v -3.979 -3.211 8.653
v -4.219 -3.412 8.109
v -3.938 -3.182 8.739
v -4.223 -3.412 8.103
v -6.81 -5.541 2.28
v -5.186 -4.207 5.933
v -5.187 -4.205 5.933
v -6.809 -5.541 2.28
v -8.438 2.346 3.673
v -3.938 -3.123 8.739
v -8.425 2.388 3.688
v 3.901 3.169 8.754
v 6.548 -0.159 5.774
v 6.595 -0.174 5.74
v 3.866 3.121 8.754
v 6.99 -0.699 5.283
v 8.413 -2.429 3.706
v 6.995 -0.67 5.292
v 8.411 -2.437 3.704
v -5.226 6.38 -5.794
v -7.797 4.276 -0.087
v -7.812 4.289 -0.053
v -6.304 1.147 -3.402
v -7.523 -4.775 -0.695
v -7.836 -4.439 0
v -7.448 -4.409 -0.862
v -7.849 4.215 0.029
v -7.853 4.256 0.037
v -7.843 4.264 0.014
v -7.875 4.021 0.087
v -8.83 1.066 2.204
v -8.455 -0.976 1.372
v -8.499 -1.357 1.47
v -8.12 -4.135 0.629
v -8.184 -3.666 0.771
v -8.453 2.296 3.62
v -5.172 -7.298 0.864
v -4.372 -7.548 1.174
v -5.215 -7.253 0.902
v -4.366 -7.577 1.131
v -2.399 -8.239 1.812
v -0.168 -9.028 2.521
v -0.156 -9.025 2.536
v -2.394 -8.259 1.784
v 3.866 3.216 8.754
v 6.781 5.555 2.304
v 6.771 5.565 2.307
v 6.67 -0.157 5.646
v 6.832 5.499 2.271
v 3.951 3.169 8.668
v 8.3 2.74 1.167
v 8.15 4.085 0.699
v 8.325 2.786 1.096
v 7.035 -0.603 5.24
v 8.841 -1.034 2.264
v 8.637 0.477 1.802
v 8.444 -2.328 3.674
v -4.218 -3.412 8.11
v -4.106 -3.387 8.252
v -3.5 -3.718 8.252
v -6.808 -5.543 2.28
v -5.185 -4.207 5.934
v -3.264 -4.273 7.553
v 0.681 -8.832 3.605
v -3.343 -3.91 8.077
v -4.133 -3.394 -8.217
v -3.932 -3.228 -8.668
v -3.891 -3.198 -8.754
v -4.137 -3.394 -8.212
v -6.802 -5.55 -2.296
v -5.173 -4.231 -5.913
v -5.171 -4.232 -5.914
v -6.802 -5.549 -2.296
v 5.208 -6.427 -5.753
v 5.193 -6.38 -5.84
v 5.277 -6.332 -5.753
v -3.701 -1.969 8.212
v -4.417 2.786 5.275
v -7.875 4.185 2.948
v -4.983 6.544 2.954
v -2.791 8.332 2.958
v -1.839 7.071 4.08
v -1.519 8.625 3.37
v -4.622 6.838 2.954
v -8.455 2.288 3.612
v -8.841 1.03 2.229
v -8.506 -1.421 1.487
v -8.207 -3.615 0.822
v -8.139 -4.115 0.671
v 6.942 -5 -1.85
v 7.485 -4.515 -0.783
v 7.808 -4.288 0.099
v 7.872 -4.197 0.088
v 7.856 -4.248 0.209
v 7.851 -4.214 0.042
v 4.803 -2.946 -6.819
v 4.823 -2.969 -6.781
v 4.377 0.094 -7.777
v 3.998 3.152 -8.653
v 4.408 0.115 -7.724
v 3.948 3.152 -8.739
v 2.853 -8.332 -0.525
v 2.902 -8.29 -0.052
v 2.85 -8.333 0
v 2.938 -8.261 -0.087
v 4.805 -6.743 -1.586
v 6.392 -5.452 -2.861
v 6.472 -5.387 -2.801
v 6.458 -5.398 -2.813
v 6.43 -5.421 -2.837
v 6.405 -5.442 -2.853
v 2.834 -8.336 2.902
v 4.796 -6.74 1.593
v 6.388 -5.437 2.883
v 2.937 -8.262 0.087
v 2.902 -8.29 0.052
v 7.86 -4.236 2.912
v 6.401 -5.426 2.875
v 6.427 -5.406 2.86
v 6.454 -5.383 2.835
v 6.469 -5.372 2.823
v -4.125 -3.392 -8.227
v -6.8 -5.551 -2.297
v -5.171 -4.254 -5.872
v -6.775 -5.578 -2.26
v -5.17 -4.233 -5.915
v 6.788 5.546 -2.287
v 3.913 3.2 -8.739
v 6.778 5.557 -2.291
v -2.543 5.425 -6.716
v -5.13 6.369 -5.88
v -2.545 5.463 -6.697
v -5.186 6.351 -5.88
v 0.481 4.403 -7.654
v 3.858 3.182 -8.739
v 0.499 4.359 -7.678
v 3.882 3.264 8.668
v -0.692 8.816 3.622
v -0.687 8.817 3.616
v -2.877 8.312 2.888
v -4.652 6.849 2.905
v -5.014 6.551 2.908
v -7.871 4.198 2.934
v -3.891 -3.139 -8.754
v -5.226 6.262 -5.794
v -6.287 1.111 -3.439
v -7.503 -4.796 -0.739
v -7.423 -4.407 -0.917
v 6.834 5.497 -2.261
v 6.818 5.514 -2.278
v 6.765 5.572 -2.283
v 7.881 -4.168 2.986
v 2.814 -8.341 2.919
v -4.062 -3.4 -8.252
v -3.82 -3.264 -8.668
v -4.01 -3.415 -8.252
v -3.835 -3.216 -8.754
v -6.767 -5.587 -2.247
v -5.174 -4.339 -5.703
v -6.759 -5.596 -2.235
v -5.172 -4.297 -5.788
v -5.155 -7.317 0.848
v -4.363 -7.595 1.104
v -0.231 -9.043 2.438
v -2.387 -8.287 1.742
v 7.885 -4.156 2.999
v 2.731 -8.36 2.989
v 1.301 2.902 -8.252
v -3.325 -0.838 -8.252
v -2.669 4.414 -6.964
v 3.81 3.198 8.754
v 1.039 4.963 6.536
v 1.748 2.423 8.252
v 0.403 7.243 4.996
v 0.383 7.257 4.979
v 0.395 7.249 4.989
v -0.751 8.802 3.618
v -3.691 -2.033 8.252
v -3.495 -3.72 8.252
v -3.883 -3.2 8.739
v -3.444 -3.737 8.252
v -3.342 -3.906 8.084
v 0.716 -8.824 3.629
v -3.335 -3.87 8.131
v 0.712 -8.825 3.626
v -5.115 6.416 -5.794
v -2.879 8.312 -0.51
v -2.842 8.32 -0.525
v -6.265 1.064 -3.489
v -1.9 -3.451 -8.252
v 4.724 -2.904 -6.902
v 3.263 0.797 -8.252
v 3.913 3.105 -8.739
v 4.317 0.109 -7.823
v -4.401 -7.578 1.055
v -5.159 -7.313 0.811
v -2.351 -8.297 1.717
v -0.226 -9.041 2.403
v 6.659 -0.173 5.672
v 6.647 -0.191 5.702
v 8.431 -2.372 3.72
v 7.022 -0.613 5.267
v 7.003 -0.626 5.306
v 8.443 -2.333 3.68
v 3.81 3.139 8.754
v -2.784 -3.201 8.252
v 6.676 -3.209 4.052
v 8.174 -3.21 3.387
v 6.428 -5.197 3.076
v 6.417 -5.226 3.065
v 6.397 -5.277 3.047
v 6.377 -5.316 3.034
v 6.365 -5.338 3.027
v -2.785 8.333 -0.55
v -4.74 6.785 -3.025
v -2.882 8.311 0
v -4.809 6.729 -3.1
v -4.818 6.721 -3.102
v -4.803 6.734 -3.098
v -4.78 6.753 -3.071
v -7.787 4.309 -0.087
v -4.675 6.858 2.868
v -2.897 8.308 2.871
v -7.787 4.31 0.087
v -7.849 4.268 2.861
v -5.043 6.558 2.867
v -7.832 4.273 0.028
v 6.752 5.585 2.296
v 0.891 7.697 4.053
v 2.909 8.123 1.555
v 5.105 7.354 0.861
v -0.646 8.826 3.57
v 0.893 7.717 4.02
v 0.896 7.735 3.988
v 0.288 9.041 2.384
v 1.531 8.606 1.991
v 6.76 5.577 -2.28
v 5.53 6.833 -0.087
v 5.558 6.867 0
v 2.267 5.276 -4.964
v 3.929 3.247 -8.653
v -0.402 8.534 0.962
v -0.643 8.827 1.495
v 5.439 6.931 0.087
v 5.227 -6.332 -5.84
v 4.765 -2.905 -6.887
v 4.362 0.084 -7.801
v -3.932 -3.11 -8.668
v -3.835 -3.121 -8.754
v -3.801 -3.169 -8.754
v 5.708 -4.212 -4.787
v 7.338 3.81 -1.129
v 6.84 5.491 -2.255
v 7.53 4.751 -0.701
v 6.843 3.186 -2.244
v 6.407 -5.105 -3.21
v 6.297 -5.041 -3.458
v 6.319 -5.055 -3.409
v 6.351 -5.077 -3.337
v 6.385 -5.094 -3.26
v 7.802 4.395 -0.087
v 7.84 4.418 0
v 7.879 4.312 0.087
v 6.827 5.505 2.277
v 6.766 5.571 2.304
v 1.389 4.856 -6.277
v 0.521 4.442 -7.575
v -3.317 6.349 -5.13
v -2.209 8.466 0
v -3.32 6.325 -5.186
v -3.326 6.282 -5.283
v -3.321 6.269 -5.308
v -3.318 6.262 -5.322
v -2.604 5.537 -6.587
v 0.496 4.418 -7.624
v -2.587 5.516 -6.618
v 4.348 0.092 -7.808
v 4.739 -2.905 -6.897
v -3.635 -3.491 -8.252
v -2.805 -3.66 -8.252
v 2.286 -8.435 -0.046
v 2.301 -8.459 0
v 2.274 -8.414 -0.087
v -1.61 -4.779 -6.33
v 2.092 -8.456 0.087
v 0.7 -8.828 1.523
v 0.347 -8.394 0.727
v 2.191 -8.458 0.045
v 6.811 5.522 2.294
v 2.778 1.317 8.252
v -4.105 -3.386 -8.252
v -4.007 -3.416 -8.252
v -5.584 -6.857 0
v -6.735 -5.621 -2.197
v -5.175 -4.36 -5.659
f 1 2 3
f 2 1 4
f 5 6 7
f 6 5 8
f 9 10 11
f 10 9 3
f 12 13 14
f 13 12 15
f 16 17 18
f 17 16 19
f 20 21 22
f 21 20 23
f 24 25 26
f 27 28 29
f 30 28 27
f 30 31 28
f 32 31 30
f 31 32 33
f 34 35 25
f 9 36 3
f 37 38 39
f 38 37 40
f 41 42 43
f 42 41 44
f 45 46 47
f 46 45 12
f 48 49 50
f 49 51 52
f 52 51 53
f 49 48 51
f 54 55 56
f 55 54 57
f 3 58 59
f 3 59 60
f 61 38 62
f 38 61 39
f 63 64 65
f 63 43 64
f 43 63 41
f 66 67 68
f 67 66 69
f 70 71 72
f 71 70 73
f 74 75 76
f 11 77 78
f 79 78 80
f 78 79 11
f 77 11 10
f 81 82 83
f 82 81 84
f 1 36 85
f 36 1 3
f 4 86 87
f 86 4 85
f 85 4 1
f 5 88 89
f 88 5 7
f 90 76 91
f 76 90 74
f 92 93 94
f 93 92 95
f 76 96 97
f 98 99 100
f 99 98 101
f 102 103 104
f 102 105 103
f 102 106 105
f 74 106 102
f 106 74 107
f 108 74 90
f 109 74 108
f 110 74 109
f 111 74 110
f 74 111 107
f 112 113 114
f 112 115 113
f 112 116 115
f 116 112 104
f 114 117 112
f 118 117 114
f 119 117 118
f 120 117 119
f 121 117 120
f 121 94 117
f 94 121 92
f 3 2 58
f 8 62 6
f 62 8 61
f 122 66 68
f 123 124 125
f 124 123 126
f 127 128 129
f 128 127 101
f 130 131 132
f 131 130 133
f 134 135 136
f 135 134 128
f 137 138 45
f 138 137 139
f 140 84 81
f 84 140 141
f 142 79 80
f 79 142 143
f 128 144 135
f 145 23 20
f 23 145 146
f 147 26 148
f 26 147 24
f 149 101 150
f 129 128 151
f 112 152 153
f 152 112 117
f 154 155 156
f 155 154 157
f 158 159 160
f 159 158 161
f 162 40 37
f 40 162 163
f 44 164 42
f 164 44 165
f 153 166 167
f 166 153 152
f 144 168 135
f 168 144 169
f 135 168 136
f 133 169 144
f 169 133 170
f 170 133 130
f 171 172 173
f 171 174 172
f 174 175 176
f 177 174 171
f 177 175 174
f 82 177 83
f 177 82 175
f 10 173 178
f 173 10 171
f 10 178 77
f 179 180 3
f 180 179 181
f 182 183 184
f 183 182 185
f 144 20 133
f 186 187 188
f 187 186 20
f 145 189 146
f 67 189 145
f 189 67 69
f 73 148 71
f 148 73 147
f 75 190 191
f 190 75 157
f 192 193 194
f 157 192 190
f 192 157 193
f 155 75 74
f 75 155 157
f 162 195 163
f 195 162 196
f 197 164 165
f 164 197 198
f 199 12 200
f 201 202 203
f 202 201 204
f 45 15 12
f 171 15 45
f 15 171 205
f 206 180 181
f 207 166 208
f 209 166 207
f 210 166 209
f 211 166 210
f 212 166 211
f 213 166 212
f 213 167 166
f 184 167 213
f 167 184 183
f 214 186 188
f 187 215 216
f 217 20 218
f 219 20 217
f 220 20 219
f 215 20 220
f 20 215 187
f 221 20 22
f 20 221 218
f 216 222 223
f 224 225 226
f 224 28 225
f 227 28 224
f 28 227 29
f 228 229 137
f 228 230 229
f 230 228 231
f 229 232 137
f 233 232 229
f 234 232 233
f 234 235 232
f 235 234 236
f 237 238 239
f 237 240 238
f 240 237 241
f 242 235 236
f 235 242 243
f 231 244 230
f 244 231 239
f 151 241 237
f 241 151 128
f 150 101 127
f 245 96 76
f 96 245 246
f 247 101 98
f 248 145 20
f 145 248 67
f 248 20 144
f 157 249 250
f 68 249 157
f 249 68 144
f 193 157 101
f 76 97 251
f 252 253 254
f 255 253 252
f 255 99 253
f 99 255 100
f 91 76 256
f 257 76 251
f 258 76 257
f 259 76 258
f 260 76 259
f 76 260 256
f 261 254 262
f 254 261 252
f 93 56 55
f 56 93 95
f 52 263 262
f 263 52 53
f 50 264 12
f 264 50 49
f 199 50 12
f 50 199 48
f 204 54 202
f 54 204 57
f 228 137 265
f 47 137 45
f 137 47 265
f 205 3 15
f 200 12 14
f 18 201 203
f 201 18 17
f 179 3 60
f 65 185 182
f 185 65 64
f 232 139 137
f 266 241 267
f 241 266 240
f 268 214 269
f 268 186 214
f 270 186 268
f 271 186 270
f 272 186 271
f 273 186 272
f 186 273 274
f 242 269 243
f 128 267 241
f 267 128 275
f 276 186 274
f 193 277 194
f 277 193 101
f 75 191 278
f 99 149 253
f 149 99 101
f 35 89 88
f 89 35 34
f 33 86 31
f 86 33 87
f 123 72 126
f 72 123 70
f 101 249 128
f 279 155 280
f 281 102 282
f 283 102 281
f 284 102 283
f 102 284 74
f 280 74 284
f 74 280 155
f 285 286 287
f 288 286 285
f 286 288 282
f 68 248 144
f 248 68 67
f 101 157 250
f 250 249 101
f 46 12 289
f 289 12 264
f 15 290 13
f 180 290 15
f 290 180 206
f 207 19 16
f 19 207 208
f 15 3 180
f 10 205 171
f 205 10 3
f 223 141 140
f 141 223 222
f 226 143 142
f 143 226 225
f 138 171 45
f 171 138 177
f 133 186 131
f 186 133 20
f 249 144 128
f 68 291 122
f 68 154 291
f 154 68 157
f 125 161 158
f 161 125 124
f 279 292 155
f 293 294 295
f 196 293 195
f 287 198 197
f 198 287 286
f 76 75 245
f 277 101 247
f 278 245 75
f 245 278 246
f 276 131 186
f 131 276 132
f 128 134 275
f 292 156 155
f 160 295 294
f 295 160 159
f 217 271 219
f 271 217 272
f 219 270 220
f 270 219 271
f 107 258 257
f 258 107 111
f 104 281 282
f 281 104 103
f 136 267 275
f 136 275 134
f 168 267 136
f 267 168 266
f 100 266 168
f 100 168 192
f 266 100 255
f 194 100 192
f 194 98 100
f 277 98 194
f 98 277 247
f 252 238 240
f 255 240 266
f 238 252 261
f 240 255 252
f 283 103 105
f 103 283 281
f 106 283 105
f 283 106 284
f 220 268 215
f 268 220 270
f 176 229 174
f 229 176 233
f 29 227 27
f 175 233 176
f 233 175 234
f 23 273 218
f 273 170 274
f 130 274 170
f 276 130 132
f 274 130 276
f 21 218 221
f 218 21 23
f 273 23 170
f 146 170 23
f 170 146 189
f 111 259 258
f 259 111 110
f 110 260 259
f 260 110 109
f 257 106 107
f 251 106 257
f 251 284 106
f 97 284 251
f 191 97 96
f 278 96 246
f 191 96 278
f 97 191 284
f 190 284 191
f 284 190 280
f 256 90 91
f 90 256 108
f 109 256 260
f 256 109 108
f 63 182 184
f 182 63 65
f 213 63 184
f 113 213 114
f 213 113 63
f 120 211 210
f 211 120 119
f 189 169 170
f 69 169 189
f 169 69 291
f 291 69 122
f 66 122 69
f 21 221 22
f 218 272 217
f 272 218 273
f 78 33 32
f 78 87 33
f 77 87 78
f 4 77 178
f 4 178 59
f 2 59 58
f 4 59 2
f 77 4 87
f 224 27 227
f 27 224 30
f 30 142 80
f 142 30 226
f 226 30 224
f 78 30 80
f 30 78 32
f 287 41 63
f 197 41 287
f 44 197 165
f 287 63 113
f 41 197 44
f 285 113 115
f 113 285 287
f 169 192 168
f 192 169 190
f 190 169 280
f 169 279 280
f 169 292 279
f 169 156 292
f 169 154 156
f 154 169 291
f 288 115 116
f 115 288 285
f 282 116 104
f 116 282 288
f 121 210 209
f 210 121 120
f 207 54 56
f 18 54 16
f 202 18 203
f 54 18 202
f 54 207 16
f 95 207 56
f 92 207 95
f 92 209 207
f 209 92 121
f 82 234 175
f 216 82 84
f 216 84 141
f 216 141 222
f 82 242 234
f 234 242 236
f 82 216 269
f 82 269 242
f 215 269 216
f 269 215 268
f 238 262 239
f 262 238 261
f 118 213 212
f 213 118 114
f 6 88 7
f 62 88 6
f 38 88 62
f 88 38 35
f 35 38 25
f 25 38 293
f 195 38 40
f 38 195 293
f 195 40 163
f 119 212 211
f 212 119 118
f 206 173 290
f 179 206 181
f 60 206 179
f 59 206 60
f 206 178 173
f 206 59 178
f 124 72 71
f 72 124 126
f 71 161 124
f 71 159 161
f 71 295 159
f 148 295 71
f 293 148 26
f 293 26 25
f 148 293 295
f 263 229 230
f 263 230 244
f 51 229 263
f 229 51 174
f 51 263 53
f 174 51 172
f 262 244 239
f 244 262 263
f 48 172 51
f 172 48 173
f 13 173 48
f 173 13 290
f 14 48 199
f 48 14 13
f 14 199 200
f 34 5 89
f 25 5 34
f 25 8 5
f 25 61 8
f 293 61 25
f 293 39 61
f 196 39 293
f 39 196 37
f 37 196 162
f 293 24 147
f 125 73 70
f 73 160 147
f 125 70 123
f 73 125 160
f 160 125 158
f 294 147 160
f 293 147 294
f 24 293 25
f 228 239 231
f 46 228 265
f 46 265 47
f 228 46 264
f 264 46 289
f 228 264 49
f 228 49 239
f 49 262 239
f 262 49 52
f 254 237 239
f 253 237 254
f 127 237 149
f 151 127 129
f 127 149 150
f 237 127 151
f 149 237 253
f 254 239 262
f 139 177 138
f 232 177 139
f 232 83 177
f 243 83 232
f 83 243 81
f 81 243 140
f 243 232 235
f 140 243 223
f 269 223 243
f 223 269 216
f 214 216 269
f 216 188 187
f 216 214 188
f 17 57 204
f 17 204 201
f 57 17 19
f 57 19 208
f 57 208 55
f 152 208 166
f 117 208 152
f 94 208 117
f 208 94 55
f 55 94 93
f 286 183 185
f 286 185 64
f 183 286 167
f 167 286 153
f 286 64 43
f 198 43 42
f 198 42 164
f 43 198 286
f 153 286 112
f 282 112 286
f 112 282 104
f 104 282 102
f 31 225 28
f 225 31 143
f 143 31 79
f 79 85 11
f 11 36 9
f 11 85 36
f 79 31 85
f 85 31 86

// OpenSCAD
// Auto-generated OpenSCAD file

    inner_points = 10*[[-0.42241592184244553, -0.3935709876343616, 0.8164965809276301], [0.552050434404801, -0.1690374254610991, 0.8164965809279018], [-0.1296345125630803, 0.5626084130956421, 0.8164965809276461], [0.5520504344052842, -0.16903742546121997, -0.8164965809275502], [-0.29278140927936525, -0.9561794007300037, -1.5987211554602254e-14], [0.29278140927936525, 0.9561794007300037, 1.5987211554602254e-14], [-0.42241592184196236, -0.3935709876344824, -0.816496580927822], [0.6816849469678814, -0.7316458385567411, 2.5579538487363607e-13], [-0.6816849469678814, 0.7316458385567411, -2.5579538487363607e-13], [-0.12963451256259706, 0.5626084130955212, -0.816496580927806], [-0.9744663562472466, -0.22453356217326248, -2.7176669244139555e-13], [0.9744663562472466, 0.22453356217326248, 2.7176669244139555e-13]];

    outer_points = 10*[[0.1279020562557553, -0.9484628204349614, 0.2899298919706412], [0.5177054037875468, -0.6332250521206378, -0.5753322068648584], [0.9027667961251077, -0.3163375745111199, 0.2914492250228672], [-0.5145441003247264, 0.6321252459238417, -0.5793634802839585], [-0.7748647398693524, -0.6321252459238417, -0.001519333052226013], [0.7748647398693524, 0.6321252459238417, 0.001519333052226013], [-0.904347447856518, 0.316887477609518, 0.2858986185515415], [-0.38506139233756087, -0.316887477609518, -0.8667814318877258], [0.38506139233756087, 0.316887477609518, 0.8667814318877258], [-0.12948270798716557, 0.9490127235333596, 0.28741795160376743], [-0.3898033475317915, -0.31523776831432365, 0.8652620988354998], [0.3898033475317915, 0.31523776831432365, -0.8652620988354998]];

    // Convex hull for inner set (I)
    module inner_hull() {
        hull() {
            for (p = inner_points) {
                translate(p) sphere(r=0.1);
            }
        }
    }

    // Convex hull for outer set (O) minus inner hull (O \ I)
    module outer_minus_inner() {
        difference() {
            hull() {
                for (p = outer_points) {
                    translate(p) sphere(r=0.1);
                }
            }
            inner_hull(); // Subtract inner hull
        }
    }

    // Convex hull for outer set (O) minus all translated inner hulls
    module outer_minus_AllTranslationInner() {
        difference() {
            hull() {
                for (p = outer_points) {
                    translate(p) sphere(r=0.1);
                }
            }
            hull() {
                translate([0,0,50]) inner_hull();
                translate([0,0,-50]) inner_hull();
            }; // Subtract translated inner hulls
        }
    }

    // Difference between outer_minus_inner and outer_minus_AllTranslationInner
    module outer_minus_inner_diff() {
        difference() {
            // Outer minus inner
            difference() {
                hull() {
                    for (p = outer_points) {
                        translate(p) sphere(r=0.1);
                    }
                }
                inner_hull();
            }

            // Subtract Outer minus AllTranslationInner
            difference() {
                hull() {
                    for (p = outer_points) {
                        translate(p) sphere(r=0.1);
                    }
                }
                hull() {
                    translate([0,0,50]) inner_hull();
                    translate([0,0,-50]) inner_hull();
                };
            }
        }
    }

    // Rendering all with colors applied
    color([1, 1, 0, 1]) outer_minus_inner_diff(); // Opaque yellow
    
